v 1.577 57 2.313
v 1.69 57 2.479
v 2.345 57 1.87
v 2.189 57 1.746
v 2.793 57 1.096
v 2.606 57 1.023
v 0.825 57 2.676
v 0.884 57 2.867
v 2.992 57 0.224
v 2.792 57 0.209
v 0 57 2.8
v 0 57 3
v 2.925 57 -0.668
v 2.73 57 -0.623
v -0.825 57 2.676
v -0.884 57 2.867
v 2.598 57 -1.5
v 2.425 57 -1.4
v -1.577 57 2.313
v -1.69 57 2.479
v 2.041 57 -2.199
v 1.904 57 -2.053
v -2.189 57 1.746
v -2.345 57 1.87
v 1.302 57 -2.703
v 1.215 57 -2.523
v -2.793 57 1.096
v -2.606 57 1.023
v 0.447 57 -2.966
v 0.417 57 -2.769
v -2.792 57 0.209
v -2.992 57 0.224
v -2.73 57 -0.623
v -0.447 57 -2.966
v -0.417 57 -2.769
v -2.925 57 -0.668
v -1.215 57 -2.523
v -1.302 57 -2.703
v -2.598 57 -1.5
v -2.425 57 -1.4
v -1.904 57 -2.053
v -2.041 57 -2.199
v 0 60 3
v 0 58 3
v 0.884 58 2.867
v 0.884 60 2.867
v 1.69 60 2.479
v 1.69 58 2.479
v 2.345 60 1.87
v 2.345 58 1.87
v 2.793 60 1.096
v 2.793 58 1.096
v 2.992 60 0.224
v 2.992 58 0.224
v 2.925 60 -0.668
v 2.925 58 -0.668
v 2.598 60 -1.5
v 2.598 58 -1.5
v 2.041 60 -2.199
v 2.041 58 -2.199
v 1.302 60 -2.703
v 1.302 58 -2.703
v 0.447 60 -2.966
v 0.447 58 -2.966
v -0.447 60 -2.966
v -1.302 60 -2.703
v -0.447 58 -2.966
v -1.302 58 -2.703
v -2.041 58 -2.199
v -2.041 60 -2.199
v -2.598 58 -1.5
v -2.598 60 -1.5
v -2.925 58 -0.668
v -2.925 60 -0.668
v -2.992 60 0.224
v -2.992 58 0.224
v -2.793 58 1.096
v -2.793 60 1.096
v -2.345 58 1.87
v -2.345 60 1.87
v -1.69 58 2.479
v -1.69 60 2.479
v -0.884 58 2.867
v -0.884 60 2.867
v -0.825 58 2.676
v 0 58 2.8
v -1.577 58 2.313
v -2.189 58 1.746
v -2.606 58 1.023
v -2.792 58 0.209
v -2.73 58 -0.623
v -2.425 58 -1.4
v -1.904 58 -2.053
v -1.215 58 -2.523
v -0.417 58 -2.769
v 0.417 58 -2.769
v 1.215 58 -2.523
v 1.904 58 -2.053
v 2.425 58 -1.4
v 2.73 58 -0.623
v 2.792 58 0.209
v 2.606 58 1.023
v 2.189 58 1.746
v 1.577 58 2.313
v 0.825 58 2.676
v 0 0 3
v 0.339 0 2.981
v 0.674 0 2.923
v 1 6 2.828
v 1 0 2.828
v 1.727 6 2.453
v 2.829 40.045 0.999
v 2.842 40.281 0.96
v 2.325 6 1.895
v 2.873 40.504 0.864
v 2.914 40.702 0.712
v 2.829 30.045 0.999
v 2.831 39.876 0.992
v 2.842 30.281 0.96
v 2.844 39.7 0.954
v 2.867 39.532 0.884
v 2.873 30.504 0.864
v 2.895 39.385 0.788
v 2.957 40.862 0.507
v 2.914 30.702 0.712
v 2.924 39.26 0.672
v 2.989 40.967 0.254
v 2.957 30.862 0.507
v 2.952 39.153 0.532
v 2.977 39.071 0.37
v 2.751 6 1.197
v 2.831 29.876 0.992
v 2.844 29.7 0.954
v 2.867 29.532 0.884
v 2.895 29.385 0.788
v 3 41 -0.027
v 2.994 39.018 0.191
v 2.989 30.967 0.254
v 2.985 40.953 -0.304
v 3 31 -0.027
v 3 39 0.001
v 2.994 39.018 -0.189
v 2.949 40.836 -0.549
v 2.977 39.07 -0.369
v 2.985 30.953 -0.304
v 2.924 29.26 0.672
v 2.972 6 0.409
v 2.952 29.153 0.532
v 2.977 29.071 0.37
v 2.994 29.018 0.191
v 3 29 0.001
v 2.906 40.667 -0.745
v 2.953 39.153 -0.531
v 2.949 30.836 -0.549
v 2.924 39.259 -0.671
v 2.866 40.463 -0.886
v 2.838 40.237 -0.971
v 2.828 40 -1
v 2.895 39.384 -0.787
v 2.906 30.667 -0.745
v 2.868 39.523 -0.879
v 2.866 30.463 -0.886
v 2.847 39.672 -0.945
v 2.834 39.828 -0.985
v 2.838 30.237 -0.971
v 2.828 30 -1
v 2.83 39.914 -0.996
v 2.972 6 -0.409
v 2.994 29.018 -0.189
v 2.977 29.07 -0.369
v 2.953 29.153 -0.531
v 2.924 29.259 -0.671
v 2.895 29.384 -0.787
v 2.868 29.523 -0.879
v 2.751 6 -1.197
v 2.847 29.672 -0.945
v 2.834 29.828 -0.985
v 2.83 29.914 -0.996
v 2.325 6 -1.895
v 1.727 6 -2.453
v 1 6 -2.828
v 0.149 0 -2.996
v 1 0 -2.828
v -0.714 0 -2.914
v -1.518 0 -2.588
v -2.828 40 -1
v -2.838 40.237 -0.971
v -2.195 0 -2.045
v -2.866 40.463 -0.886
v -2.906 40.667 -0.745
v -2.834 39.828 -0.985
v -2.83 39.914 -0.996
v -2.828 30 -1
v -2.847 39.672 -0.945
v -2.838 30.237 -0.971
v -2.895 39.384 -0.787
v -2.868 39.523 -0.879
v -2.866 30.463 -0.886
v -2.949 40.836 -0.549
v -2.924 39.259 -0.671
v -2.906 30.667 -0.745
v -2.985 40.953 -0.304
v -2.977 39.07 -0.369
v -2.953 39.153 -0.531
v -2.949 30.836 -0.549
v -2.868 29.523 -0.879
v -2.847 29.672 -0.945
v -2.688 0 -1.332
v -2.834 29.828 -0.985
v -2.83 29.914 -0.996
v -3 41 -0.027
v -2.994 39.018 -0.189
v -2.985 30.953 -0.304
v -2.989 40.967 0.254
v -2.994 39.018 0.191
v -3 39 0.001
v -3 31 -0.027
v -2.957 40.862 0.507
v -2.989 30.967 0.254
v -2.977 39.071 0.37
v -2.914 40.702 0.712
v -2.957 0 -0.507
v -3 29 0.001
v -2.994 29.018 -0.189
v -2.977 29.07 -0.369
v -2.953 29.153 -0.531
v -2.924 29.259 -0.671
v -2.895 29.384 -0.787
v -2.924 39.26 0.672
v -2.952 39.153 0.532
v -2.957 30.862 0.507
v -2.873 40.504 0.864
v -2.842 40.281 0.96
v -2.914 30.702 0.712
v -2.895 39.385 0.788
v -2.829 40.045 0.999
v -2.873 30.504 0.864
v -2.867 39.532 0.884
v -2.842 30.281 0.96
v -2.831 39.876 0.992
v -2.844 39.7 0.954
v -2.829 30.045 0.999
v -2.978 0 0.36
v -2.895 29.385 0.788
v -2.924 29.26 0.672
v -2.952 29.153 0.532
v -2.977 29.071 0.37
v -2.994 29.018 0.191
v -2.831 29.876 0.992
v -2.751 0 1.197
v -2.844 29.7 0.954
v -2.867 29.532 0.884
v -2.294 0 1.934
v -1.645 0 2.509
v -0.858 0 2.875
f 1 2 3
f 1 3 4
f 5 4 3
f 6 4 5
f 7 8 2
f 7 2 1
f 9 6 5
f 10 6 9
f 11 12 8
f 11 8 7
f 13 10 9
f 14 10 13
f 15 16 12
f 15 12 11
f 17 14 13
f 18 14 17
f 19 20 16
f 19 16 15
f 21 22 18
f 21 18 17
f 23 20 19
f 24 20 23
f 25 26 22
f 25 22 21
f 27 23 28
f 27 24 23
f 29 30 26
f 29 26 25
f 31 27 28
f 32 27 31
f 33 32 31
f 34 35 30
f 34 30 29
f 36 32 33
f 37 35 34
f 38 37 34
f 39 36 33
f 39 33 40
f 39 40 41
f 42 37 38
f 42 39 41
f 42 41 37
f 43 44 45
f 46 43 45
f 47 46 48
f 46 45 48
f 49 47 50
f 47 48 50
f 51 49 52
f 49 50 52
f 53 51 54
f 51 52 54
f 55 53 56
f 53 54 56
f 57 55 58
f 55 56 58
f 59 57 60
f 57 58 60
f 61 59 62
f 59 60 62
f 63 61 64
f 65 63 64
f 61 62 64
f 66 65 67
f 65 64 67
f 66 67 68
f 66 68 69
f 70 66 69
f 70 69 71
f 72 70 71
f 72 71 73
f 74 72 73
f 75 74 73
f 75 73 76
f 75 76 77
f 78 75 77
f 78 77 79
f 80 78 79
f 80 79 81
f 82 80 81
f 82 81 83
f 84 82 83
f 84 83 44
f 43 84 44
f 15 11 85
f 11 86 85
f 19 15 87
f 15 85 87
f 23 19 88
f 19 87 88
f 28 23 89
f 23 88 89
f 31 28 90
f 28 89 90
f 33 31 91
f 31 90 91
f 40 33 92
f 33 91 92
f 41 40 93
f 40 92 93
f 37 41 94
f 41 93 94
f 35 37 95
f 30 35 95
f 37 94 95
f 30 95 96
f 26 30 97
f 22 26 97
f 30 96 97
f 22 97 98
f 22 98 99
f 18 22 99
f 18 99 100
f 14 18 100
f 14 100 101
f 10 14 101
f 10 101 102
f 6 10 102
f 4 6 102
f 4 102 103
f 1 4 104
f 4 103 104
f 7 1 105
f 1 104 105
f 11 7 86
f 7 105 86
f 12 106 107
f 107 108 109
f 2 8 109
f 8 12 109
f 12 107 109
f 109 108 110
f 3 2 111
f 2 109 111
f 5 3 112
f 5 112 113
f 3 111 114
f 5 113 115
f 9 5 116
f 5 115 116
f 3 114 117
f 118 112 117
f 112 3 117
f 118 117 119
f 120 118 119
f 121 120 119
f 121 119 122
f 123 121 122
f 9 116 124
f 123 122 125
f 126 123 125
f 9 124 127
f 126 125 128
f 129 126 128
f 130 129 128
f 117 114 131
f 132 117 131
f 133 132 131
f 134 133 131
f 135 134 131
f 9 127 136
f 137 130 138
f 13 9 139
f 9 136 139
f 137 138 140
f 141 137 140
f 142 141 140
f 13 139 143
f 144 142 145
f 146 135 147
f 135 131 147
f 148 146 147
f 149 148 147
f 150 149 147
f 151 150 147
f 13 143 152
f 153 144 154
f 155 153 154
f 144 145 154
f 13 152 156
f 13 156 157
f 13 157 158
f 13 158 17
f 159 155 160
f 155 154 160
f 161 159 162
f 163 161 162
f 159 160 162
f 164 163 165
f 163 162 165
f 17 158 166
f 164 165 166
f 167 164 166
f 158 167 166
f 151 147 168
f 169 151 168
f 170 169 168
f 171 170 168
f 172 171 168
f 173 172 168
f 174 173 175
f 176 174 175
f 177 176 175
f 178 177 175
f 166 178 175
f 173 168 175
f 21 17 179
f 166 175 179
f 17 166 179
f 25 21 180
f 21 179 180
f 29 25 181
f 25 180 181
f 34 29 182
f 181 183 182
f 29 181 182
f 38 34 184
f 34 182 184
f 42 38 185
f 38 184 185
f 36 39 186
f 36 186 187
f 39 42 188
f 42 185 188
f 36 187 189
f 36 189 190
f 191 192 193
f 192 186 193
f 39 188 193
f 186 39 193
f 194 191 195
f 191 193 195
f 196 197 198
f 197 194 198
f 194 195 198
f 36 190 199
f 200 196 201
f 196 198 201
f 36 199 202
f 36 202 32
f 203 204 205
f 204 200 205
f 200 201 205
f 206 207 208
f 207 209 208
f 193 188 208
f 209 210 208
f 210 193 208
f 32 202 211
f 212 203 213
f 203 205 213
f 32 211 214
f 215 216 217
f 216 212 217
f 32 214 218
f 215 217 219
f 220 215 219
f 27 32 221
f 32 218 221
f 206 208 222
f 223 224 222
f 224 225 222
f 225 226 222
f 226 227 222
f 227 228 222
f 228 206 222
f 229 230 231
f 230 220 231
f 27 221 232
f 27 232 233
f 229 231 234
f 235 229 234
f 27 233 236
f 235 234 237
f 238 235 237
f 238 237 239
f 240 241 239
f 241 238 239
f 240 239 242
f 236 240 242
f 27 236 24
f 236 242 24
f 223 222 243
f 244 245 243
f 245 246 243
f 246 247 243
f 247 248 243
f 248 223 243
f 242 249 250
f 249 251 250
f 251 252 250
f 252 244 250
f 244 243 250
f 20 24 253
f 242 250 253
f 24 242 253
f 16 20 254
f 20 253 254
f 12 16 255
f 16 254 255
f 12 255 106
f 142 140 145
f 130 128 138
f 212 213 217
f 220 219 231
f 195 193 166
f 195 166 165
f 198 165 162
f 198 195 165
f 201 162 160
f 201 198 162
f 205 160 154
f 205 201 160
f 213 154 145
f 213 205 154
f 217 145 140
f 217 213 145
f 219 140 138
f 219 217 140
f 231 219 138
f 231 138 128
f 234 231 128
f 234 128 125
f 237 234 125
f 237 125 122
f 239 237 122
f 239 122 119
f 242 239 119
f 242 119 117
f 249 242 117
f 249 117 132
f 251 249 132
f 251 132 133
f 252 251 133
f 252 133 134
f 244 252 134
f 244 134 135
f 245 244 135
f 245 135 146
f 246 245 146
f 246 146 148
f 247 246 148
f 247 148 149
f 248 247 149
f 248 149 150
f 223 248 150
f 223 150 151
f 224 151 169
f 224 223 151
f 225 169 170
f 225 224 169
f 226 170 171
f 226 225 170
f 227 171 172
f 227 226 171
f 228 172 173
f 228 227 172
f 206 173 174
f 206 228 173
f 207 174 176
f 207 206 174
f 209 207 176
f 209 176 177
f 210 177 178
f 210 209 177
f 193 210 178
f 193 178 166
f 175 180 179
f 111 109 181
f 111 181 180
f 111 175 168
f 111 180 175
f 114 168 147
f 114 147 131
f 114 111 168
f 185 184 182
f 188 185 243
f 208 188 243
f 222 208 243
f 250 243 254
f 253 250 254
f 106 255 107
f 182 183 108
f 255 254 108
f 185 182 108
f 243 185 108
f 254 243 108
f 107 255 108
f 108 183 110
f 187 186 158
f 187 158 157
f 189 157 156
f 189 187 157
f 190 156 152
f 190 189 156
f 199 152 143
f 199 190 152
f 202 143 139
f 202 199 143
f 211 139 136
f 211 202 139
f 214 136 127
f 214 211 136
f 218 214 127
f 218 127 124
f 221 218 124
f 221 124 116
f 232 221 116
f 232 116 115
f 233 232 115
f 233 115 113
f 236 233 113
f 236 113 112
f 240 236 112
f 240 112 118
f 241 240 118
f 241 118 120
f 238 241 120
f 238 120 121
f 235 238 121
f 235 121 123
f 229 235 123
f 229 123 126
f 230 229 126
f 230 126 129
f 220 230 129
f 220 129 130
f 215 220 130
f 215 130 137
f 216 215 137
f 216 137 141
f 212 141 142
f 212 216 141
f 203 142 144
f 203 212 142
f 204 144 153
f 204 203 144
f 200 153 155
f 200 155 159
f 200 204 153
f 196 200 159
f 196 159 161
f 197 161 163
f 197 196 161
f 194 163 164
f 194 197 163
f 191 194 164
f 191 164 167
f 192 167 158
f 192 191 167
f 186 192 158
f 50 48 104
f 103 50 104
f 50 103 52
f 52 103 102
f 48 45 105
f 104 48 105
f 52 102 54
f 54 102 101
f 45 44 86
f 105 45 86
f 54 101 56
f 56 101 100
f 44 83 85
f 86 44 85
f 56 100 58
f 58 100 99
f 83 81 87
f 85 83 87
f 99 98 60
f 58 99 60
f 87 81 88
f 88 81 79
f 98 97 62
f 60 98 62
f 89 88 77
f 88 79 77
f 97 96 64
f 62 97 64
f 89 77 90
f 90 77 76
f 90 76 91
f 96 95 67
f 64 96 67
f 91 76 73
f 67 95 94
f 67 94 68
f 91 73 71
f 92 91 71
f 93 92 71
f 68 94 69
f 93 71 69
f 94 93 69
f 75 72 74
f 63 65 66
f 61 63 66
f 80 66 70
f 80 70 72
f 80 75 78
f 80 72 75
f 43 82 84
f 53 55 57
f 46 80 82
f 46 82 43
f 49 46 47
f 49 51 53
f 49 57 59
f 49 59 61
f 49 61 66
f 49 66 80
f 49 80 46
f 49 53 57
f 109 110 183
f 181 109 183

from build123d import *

# Parameters (mm, degrees)
CROQUIS1_R                 = 3
SALIENTE_EXTRUIR1_DEPTH    = 60
CROQUIS2_W                 = 5.531234996
CROQUIS2_H                 = 1
CORTAR_EXTRUIR1_DEPTH      = 61.149812967
CORTAR_EXTRUIR1_DEPTH_BACK = 61.149812967
CROQUIS3_R                 = 1
CORTAR_EXTRUIR2_DEPTH      = 6


with BuildPart() as part:
    # Croquis1 → Saliente-Extruir1 (new body)
    with BuildSketch(Plane(origin=(0, 0, 0), x_dir=(1, 0, 0), z_dir=(0, 1, 0))):
        with Locations(Location((0, 0, 0), (0, 0, 270))):
            Circle(CROQUIS1_R)
    extrude(amount=SALIENTE_EXTRUIR1_DEPTH)

    # Croquis2 → Cortar-Revolución1 (revolve, cut)
    with BuildSketch(Plane.XY, mode=Mode.PRIVATE) as cortar_revoluci_n1_sk:
        with Locations((5.565617498, 57.5)):
            Rectangle(CROQUIS2_W, CROQUIS2_H)
    revolve(cortar_revoluci_n1_sk.sketch.rotate(Axis((0, 60, 0), (0, -1, 0)), 90), axis=Axis((0, 60, 0), (0, -1, 0)), mode=Mode.SUBTRACT)

    # Croquis3 → Cortar-Extruir1 (cut, two sides: drawn at the far end of the back side and taken through both)
    with BuildSketch(Plane(origin=(0, 0, 0), x_dir=(0, 0, -1), z_dir=(1, 0, 0)).offset(-CORTAR_EXTRUIR1_DEPTH_BACK)):
        with Locations((0, 40)):
            Circle(CROQUIS3_R)
        with Locations((0, 30)):
            Circle(CROQUIS3_R)
    extrude(amount=CORTAR_EXTRUIR1_DEPTH + CORTAR_EXTRUIR1_DEPTH_BACK, mode=Mode.SUBTRACT)

    # Croquis4 → Cortar-Extruir2 (cut)
    with BuildSketch(Plane.XZ):
        with BuildLine():
            Line((1, 2.828427125), (1, -2.828427125))
            ThreePointArc((1, -2.828427125), (3, 0), (1, 2.828427125))
        make_face()
    extrude(amount=-CORTAR_EXTRUIR2_DEPTH, mode=Mode.SUBTRACT)


solid = part.part
